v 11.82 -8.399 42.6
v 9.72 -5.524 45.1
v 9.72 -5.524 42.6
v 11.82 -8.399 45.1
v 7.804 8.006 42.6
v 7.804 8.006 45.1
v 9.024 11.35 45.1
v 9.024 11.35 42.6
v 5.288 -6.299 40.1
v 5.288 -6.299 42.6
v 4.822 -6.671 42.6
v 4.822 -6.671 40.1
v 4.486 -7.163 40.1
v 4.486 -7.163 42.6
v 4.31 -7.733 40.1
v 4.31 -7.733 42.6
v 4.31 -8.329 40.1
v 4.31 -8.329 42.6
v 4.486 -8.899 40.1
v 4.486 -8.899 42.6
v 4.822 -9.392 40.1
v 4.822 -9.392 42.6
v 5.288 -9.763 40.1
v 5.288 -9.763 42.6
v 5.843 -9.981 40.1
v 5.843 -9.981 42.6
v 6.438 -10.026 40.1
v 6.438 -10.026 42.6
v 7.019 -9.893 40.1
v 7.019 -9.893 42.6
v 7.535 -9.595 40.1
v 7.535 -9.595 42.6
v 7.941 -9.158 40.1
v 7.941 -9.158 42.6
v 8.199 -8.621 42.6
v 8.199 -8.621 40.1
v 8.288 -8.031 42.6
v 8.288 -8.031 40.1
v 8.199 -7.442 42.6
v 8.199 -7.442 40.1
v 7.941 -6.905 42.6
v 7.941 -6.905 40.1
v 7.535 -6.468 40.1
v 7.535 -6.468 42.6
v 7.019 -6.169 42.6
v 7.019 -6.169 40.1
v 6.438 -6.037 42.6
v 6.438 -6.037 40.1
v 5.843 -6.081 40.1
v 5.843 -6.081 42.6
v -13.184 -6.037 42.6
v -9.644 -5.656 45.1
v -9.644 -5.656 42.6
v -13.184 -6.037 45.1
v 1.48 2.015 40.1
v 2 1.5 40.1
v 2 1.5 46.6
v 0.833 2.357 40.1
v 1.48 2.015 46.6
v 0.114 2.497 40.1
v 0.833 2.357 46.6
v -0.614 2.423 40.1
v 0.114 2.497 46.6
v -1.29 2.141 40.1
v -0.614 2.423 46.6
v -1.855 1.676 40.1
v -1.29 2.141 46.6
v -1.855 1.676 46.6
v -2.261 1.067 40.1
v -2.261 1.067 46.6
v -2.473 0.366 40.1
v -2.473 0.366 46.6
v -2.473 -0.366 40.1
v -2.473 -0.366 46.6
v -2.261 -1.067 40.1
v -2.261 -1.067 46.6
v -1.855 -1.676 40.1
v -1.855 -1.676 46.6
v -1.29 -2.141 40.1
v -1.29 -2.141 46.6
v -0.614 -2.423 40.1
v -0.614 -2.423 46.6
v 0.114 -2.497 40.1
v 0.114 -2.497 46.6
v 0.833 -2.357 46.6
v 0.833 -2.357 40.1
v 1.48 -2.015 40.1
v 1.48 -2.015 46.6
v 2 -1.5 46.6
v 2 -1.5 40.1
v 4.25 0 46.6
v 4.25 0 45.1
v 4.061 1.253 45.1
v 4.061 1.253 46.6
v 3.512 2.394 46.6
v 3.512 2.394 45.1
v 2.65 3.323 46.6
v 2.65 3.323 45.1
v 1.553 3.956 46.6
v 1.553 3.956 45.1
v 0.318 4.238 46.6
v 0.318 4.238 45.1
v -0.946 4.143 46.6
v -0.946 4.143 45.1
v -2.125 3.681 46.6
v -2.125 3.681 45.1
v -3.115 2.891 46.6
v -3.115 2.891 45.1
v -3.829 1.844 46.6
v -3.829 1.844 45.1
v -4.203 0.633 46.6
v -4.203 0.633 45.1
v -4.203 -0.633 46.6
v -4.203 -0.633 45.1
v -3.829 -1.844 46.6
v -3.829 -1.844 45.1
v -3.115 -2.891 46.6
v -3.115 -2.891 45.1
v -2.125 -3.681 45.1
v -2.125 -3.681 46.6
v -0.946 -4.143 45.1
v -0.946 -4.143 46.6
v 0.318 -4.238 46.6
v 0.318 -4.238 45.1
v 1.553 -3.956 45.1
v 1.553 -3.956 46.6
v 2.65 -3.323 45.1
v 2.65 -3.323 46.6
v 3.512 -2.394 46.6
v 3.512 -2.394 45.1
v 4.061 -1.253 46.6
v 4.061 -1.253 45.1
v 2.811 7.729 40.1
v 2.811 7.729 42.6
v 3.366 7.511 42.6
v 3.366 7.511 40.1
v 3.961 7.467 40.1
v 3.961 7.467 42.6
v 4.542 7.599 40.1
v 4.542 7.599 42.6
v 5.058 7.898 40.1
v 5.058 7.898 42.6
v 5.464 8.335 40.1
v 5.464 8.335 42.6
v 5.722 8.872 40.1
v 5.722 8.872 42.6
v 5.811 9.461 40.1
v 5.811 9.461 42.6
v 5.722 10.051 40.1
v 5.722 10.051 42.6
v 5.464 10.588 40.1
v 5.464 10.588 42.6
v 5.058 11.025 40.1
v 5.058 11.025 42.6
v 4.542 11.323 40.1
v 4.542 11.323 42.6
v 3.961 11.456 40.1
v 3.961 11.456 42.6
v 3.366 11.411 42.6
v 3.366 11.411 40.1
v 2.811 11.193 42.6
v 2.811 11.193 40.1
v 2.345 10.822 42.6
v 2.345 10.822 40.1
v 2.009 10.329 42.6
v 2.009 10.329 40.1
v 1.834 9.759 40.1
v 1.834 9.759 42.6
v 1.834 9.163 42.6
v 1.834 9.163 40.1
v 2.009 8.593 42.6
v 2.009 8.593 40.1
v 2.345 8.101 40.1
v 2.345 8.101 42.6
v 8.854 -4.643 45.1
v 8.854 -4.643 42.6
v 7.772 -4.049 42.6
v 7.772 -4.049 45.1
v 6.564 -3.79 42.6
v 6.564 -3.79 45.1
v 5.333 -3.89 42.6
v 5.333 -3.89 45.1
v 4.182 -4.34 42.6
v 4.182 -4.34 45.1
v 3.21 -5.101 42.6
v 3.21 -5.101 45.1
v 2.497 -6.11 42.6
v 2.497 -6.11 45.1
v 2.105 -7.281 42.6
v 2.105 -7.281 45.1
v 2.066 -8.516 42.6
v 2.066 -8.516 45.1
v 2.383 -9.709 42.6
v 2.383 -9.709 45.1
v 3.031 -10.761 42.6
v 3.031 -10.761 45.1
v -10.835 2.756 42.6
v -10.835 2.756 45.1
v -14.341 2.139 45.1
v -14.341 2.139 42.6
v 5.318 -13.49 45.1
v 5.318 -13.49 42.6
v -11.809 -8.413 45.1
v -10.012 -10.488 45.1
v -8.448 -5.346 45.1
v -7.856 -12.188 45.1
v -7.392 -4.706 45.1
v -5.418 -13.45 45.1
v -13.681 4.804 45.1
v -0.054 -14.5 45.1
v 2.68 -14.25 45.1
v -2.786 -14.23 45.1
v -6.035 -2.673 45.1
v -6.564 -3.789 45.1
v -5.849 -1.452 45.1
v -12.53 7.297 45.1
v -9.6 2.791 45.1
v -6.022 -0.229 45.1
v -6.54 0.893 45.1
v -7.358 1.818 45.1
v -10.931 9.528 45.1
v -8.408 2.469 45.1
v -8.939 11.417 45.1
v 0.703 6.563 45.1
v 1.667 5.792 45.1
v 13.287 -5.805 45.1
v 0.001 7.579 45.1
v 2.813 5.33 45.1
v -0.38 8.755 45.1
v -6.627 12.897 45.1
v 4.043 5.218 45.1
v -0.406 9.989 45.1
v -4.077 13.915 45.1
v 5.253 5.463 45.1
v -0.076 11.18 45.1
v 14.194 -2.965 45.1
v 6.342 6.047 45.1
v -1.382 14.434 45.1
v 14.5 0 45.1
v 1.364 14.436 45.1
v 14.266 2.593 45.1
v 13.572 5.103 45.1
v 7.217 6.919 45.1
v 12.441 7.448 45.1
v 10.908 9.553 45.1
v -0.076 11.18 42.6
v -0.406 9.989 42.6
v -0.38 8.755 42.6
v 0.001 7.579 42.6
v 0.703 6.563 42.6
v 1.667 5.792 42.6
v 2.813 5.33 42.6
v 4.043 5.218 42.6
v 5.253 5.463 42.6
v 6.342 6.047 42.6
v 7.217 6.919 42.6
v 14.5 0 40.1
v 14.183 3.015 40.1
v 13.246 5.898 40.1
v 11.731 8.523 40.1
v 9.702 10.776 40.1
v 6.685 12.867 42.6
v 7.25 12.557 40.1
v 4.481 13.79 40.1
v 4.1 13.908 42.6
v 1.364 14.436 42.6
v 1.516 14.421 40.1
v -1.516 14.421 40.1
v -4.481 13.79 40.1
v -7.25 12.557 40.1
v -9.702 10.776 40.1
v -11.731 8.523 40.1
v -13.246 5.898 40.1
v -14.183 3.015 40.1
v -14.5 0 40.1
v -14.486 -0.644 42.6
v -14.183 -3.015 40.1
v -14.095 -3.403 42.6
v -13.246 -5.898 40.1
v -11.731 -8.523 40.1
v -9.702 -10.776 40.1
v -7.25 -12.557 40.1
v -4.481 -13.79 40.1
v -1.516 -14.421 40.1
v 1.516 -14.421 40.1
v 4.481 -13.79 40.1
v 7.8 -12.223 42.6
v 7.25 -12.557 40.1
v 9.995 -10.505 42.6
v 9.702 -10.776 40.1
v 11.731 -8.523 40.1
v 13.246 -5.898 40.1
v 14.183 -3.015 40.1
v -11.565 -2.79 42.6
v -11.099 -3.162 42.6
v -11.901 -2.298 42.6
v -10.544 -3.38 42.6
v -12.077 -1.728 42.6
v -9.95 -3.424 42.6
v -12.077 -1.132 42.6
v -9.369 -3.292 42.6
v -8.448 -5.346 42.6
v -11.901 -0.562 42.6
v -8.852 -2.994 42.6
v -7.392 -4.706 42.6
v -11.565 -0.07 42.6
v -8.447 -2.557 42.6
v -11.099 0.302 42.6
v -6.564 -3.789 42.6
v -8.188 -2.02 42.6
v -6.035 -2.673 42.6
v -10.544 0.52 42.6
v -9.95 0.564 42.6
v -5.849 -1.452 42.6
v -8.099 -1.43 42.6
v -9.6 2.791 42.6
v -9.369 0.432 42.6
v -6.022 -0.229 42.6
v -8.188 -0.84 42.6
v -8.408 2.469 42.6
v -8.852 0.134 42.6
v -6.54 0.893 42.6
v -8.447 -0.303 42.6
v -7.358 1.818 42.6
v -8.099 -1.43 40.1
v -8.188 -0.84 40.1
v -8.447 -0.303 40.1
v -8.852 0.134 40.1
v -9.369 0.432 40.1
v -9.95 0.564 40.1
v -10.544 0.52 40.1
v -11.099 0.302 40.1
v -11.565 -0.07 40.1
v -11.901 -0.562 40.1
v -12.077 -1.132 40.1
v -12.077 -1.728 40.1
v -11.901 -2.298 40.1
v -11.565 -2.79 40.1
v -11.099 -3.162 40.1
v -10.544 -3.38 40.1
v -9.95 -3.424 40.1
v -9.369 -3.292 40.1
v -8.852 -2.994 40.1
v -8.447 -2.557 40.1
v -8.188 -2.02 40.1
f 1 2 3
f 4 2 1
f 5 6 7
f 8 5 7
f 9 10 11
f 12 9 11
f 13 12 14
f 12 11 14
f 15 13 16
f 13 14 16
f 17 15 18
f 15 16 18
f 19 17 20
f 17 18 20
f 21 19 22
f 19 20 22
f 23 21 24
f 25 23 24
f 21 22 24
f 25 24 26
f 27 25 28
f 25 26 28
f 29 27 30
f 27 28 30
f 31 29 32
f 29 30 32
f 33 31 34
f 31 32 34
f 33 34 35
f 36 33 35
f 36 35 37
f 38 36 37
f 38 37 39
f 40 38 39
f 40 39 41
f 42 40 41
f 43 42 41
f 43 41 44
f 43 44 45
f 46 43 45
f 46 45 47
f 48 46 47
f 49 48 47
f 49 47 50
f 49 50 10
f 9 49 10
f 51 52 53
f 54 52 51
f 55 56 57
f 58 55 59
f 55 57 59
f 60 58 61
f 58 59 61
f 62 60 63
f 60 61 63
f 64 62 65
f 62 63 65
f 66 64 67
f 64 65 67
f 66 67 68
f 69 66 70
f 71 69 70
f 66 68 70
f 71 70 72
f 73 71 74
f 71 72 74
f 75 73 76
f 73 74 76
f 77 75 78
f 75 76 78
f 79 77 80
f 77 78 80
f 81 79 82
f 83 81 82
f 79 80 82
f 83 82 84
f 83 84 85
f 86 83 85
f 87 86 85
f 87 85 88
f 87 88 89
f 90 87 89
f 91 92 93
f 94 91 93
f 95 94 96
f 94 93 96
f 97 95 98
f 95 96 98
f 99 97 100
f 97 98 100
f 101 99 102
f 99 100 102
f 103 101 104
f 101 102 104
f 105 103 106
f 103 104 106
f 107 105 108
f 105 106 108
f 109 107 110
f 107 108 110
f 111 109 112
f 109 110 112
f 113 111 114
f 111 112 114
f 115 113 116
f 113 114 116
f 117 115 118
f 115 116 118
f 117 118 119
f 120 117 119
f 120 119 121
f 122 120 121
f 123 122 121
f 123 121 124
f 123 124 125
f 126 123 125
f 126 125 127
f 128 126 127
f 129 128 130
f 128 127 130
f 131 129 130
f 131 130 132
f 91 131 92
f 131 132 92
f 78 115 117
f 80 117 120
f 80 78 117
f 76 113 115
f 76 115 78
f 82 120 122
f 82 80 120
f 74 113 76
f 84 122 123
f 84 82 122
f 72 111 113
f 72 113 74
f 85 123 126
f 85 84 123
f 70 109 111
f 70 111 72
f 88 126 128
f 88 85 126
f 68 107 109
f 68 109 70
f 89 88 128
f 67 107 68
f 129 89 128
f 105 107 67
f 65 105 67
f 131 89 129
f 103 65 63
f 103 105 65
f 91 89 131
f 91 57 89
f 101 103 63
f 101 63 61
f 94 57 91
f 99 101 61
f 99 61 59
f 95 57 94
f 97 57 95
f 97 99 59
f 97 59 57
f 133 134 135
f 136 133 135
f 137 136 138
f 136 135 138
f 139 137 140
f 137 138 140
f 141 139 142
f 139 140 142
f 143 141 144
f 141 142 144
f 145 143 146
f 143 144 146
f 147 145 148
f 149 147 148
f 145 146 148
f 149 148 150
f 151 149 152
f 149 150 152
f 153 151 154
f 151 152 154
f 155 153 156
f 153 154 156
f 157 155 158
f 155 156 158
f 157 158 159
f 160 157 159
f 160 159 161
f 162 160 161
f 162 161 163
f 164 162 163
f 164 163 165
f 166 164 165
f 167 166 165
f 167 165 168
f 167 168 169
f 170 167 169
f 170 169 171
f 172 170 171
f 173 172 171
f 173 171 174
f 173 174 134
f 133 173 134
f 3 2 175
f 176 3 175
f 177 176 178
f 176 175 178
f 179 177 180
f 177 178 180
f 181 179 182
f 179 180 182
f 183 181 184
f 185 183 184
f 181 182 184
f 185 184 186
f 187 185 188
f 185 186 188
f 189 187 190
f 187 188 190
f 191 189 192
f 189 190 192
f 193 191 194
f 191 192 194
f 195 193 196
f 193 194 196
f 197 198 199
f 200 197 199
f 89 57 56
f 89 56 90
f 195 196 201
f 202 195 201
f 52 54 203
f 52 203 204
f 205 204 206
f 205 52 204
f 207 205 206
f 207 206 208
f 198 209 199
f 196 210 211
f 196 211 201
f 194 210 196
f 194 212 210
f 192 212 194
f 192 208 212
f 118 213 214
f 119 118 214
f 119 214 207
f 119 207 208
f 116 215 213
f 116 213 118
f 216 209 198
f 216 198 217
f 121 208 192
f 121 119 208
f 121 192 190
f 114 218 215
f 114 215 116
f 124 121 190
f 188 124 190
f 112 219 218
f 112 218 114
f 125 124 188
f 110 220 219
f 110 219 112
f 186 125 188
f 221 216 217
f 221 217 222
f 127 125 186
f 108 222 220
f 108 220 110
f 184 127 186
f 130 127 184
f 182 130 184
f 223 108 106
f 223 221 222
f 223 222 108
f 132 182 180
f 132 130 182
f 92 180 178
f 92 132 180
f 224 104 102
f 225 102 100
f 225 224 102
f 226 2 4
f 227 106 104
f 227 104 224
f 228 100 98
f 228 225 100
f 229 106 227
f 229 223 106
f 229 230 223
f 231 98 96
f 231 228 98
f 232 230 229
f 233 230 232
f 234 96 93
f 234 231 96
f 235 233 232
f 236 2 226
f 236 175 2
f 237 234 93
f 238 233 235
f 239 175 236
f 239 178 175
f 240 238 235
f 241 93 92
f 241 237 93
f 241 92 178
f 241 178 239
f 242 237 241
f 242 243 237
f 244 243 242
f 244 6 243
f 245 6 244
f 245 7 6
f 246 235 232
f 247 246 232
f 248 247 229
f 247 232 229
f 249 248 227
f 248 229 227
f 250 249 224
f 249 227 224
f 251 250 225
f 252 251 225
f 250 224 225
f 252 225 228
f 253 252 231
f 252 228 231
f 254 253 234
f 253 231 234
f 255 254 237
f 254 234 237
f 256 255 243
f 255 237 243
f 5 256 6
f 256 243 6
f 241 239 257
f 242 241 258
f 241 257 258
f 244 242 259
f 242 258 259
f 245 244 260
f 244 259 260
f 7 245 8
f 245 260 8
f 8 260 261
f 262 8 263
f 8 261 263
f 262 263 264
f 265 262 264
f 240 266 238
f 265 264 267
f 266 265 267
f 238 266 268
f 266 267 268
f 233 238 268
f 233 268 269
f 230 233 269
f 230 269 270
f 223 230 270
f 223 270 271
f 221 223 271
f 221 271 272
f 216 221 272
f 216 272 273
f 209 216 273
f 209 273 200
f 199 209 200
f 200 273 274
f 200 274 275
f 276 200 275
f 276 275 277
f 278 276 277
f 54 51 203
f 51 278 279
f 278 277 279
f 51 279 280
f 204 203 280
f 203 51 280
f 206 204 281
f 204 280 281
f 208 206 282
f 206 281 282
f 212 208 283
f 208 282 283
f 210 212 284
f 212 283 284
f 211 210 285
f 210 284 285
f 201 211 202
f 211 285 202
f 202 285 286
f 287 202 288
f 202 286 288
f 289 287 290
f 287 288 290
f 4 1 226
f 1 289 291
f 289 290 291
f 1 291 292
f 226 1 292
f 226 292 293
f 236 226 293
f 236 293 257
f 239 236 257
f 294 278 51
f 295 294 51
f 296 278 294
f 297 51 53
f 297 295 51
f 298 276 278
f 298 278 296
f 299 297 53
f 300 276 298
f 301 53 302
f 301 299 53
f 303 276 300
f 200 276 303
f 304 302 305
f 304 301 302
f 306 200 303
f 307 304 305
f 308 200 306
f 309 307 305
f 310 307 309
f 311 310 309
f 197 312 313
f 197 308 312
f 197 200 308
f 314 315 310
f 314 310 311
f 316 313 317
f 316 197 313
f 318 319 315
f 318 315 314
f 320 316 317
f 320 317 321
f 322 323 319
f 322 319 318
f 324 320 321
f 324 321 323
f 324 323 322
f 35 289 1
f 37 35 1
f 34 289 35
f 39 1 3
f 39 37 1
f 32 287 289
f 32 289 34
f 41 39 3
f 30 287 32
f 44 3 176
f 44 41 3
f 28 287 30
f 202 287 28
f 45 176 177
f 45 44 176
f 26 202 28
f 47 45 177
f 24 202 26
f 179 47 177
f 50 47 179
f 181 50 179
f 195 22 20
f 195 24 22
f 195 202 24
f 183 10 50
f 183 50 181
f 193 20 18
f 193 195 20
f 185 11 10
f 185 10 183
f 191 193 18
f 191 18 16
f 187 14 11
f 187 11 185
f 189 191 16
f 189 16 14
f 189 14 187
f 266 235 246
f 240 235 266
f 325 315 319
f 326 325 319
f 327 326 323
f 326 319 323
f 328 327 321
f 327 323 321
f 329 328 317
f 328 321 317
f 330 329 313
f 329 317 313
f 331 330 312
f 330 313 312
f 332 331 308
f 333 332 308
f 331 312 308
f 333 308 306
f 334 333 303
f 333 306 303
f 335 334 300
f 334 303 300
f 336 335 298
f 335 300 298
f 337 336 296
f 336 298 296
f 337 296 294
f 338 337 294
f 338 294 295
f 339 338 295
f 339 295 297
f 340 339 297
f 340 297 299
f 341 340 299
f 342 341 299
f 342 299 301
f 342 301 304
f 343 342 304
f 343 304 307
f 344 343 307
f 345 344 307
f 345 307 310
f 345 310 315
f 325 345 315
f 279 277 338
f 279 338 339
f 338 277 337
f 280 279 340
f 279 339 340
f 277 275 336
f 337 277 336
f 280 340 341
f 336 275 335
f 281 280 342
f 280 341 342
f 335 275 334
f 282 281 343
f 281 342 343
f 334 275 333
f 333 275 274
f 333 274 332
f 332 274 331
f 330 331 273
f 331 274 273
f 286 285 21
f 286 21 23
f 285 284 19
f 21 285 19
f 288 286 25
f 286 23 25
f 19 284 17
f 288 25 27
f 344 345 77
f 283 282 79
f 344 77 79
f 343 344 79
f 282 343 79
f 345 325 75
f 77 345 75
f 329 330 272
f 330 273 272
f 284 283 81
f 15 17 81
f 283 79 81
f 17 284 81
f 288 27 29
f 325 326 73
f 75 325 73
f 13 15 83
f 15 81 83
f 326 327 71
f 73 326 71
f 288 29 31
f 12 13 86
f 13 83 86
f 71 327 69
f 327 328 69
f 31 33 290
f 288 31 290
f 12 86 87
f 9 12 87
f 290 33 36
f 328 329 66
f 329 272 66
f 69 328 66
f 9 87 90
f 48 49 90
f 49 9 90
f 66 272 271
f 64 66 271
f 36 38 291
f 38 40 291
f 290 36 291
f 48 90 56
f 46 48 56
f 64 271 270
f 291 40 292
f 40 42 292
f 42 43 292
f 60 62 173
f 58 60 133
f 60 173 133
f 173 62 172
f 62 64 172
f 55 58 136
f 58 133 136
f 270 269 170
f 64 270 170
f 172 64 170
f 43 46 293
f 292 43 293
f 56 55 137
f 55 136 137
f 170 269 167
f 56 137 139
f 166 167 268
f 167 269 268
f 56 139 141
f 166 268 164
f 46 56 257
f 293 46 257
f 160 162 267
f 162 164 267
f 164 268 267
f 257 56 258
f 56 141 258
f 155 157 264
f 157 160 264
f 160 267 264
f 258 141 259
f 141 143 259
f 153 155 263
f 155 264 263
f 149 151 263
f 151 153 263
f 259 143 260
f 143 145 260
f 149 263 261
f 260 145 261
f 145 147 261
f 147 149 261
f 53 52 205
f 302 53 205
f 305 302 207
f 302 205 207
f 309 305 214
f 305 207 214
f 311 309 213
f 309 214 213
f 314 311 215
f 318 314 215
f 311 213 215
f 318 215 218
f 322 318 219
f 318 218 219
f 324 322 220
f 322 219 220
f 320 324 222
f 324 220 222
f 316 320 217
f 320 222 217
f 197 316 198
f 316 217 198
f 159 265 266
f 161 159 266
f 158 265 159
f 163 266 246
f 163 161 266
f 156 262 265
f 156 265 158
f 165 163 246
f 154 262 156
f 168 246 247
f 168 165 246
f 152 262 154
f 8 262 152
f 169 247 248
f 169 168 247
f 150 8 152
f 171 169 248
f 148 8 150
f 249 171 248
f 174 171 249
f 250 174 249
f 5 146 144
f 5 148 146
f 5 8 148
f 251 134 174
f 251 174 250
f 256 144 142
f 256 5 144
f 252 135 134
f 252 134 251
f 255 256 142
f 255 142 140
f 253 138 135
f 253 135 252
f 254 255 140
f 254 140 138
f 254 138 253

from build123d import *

# Parameters (mm, degrees)
SKETCH034_R          = 14.5
PAD014_DEPTH         = 5
SKETCH035_R          = 4.25
PAD015_DEPTH         = 1.5
SKETCH036_R          = 2
POCKET019_DEPTH      = 88.049178788
POCKET020_DEPTH      = 2.5
POLARPATTERN_COUNT   = 3
POCKET021_DEPTH      = 5.001
POCKET021_DEPTH_BACK = 1.501


with BuildPart() as part:
    # Sketch034 → Pad014 (new body)
    with BuildSketch(Plane.XY.offset(40.1)):
        Circle(SKETCH034_R)
    extrude(amount=PAD014_DEPTH)

    # Sketch035 → Pad015 (join)
    with BuildSketch(Plane.XY.offset(45.1)):
        Circle(SKETCH035_R)
    extrude(amount=PAD015_DEPTH)

    # Sketch036 → Pocket019 (cut, through all)
    with BuildSketch(Plane.XY.offset(45.1)):
        with Locations((-10.0992623493, -1.43)):
            Circle(SKETCH036_R)
    pocket019 = extrude(amount=-POCKET019_DEPTH, mode=Mode.SUBTRACT)

    # Sketch037 → Pocket020 (cut)
    with BuildSketch(Plane.XY.offset(45.1)):
        with BuildLine():
            ThreePointArc((-9.644040596, -5.6555500417), (-5.8912363704, -0.8341666667), (-10.83504492, 2.7558241732))
            Line((-10.83504492, 2.7558241732), (-14.3412882274, 2.1394980669))
            ThreePointArc((-14.3412882274, 2.1394980669), (-14.3567945162, -2.0328431373), (-13.1835601604, -6.0368652045))
            Line((-9.644040596, -5.6555500417), (-13.1835601604, -6.0368652045))
        make_face()
    pocket020 = extrude(amount=-POCKET020_DEPTH, mode=Mode.SUBTRACT)

    # PolarPattern: Pocket019, Pocket020 ×3 about axis
    polarpattern_axis = Axis((0, 0, 45.1), (0, 0, 1))
    for i in range(1, POLARPATTERN_COUNT):
        add(pocket019.rotate(polarpattern_axis, i * 360 / POLARPATTERN_COUNT), mode=Mode.SUBTRACT)
        add(pocket020.rotate(polarpattern_axis, i * 360 / POLARPATTERN_COUNT), mode=Mode.SUBTRACT)

    # Sketch038 → Pocket021 (cut, two sides)
    with BuildSketch(Plane.XY.offset(45.1)) as pocket021_sk:
        with BuildLine():
            Line((2, 1.5), (2, -1.5))
            ThreePointArc((2, 1.5), (-2.5, 0), (2, -1.5))
        make_face()
    extrude(amount=-POCKET021_DEPTH, mode=Mode.SUBTRACT)
    extrude(pocket021_sk.sketch, amount=POCKET021_DEPTH_BACK, mode=Mode.SUBTRACT)


solid = part.part
